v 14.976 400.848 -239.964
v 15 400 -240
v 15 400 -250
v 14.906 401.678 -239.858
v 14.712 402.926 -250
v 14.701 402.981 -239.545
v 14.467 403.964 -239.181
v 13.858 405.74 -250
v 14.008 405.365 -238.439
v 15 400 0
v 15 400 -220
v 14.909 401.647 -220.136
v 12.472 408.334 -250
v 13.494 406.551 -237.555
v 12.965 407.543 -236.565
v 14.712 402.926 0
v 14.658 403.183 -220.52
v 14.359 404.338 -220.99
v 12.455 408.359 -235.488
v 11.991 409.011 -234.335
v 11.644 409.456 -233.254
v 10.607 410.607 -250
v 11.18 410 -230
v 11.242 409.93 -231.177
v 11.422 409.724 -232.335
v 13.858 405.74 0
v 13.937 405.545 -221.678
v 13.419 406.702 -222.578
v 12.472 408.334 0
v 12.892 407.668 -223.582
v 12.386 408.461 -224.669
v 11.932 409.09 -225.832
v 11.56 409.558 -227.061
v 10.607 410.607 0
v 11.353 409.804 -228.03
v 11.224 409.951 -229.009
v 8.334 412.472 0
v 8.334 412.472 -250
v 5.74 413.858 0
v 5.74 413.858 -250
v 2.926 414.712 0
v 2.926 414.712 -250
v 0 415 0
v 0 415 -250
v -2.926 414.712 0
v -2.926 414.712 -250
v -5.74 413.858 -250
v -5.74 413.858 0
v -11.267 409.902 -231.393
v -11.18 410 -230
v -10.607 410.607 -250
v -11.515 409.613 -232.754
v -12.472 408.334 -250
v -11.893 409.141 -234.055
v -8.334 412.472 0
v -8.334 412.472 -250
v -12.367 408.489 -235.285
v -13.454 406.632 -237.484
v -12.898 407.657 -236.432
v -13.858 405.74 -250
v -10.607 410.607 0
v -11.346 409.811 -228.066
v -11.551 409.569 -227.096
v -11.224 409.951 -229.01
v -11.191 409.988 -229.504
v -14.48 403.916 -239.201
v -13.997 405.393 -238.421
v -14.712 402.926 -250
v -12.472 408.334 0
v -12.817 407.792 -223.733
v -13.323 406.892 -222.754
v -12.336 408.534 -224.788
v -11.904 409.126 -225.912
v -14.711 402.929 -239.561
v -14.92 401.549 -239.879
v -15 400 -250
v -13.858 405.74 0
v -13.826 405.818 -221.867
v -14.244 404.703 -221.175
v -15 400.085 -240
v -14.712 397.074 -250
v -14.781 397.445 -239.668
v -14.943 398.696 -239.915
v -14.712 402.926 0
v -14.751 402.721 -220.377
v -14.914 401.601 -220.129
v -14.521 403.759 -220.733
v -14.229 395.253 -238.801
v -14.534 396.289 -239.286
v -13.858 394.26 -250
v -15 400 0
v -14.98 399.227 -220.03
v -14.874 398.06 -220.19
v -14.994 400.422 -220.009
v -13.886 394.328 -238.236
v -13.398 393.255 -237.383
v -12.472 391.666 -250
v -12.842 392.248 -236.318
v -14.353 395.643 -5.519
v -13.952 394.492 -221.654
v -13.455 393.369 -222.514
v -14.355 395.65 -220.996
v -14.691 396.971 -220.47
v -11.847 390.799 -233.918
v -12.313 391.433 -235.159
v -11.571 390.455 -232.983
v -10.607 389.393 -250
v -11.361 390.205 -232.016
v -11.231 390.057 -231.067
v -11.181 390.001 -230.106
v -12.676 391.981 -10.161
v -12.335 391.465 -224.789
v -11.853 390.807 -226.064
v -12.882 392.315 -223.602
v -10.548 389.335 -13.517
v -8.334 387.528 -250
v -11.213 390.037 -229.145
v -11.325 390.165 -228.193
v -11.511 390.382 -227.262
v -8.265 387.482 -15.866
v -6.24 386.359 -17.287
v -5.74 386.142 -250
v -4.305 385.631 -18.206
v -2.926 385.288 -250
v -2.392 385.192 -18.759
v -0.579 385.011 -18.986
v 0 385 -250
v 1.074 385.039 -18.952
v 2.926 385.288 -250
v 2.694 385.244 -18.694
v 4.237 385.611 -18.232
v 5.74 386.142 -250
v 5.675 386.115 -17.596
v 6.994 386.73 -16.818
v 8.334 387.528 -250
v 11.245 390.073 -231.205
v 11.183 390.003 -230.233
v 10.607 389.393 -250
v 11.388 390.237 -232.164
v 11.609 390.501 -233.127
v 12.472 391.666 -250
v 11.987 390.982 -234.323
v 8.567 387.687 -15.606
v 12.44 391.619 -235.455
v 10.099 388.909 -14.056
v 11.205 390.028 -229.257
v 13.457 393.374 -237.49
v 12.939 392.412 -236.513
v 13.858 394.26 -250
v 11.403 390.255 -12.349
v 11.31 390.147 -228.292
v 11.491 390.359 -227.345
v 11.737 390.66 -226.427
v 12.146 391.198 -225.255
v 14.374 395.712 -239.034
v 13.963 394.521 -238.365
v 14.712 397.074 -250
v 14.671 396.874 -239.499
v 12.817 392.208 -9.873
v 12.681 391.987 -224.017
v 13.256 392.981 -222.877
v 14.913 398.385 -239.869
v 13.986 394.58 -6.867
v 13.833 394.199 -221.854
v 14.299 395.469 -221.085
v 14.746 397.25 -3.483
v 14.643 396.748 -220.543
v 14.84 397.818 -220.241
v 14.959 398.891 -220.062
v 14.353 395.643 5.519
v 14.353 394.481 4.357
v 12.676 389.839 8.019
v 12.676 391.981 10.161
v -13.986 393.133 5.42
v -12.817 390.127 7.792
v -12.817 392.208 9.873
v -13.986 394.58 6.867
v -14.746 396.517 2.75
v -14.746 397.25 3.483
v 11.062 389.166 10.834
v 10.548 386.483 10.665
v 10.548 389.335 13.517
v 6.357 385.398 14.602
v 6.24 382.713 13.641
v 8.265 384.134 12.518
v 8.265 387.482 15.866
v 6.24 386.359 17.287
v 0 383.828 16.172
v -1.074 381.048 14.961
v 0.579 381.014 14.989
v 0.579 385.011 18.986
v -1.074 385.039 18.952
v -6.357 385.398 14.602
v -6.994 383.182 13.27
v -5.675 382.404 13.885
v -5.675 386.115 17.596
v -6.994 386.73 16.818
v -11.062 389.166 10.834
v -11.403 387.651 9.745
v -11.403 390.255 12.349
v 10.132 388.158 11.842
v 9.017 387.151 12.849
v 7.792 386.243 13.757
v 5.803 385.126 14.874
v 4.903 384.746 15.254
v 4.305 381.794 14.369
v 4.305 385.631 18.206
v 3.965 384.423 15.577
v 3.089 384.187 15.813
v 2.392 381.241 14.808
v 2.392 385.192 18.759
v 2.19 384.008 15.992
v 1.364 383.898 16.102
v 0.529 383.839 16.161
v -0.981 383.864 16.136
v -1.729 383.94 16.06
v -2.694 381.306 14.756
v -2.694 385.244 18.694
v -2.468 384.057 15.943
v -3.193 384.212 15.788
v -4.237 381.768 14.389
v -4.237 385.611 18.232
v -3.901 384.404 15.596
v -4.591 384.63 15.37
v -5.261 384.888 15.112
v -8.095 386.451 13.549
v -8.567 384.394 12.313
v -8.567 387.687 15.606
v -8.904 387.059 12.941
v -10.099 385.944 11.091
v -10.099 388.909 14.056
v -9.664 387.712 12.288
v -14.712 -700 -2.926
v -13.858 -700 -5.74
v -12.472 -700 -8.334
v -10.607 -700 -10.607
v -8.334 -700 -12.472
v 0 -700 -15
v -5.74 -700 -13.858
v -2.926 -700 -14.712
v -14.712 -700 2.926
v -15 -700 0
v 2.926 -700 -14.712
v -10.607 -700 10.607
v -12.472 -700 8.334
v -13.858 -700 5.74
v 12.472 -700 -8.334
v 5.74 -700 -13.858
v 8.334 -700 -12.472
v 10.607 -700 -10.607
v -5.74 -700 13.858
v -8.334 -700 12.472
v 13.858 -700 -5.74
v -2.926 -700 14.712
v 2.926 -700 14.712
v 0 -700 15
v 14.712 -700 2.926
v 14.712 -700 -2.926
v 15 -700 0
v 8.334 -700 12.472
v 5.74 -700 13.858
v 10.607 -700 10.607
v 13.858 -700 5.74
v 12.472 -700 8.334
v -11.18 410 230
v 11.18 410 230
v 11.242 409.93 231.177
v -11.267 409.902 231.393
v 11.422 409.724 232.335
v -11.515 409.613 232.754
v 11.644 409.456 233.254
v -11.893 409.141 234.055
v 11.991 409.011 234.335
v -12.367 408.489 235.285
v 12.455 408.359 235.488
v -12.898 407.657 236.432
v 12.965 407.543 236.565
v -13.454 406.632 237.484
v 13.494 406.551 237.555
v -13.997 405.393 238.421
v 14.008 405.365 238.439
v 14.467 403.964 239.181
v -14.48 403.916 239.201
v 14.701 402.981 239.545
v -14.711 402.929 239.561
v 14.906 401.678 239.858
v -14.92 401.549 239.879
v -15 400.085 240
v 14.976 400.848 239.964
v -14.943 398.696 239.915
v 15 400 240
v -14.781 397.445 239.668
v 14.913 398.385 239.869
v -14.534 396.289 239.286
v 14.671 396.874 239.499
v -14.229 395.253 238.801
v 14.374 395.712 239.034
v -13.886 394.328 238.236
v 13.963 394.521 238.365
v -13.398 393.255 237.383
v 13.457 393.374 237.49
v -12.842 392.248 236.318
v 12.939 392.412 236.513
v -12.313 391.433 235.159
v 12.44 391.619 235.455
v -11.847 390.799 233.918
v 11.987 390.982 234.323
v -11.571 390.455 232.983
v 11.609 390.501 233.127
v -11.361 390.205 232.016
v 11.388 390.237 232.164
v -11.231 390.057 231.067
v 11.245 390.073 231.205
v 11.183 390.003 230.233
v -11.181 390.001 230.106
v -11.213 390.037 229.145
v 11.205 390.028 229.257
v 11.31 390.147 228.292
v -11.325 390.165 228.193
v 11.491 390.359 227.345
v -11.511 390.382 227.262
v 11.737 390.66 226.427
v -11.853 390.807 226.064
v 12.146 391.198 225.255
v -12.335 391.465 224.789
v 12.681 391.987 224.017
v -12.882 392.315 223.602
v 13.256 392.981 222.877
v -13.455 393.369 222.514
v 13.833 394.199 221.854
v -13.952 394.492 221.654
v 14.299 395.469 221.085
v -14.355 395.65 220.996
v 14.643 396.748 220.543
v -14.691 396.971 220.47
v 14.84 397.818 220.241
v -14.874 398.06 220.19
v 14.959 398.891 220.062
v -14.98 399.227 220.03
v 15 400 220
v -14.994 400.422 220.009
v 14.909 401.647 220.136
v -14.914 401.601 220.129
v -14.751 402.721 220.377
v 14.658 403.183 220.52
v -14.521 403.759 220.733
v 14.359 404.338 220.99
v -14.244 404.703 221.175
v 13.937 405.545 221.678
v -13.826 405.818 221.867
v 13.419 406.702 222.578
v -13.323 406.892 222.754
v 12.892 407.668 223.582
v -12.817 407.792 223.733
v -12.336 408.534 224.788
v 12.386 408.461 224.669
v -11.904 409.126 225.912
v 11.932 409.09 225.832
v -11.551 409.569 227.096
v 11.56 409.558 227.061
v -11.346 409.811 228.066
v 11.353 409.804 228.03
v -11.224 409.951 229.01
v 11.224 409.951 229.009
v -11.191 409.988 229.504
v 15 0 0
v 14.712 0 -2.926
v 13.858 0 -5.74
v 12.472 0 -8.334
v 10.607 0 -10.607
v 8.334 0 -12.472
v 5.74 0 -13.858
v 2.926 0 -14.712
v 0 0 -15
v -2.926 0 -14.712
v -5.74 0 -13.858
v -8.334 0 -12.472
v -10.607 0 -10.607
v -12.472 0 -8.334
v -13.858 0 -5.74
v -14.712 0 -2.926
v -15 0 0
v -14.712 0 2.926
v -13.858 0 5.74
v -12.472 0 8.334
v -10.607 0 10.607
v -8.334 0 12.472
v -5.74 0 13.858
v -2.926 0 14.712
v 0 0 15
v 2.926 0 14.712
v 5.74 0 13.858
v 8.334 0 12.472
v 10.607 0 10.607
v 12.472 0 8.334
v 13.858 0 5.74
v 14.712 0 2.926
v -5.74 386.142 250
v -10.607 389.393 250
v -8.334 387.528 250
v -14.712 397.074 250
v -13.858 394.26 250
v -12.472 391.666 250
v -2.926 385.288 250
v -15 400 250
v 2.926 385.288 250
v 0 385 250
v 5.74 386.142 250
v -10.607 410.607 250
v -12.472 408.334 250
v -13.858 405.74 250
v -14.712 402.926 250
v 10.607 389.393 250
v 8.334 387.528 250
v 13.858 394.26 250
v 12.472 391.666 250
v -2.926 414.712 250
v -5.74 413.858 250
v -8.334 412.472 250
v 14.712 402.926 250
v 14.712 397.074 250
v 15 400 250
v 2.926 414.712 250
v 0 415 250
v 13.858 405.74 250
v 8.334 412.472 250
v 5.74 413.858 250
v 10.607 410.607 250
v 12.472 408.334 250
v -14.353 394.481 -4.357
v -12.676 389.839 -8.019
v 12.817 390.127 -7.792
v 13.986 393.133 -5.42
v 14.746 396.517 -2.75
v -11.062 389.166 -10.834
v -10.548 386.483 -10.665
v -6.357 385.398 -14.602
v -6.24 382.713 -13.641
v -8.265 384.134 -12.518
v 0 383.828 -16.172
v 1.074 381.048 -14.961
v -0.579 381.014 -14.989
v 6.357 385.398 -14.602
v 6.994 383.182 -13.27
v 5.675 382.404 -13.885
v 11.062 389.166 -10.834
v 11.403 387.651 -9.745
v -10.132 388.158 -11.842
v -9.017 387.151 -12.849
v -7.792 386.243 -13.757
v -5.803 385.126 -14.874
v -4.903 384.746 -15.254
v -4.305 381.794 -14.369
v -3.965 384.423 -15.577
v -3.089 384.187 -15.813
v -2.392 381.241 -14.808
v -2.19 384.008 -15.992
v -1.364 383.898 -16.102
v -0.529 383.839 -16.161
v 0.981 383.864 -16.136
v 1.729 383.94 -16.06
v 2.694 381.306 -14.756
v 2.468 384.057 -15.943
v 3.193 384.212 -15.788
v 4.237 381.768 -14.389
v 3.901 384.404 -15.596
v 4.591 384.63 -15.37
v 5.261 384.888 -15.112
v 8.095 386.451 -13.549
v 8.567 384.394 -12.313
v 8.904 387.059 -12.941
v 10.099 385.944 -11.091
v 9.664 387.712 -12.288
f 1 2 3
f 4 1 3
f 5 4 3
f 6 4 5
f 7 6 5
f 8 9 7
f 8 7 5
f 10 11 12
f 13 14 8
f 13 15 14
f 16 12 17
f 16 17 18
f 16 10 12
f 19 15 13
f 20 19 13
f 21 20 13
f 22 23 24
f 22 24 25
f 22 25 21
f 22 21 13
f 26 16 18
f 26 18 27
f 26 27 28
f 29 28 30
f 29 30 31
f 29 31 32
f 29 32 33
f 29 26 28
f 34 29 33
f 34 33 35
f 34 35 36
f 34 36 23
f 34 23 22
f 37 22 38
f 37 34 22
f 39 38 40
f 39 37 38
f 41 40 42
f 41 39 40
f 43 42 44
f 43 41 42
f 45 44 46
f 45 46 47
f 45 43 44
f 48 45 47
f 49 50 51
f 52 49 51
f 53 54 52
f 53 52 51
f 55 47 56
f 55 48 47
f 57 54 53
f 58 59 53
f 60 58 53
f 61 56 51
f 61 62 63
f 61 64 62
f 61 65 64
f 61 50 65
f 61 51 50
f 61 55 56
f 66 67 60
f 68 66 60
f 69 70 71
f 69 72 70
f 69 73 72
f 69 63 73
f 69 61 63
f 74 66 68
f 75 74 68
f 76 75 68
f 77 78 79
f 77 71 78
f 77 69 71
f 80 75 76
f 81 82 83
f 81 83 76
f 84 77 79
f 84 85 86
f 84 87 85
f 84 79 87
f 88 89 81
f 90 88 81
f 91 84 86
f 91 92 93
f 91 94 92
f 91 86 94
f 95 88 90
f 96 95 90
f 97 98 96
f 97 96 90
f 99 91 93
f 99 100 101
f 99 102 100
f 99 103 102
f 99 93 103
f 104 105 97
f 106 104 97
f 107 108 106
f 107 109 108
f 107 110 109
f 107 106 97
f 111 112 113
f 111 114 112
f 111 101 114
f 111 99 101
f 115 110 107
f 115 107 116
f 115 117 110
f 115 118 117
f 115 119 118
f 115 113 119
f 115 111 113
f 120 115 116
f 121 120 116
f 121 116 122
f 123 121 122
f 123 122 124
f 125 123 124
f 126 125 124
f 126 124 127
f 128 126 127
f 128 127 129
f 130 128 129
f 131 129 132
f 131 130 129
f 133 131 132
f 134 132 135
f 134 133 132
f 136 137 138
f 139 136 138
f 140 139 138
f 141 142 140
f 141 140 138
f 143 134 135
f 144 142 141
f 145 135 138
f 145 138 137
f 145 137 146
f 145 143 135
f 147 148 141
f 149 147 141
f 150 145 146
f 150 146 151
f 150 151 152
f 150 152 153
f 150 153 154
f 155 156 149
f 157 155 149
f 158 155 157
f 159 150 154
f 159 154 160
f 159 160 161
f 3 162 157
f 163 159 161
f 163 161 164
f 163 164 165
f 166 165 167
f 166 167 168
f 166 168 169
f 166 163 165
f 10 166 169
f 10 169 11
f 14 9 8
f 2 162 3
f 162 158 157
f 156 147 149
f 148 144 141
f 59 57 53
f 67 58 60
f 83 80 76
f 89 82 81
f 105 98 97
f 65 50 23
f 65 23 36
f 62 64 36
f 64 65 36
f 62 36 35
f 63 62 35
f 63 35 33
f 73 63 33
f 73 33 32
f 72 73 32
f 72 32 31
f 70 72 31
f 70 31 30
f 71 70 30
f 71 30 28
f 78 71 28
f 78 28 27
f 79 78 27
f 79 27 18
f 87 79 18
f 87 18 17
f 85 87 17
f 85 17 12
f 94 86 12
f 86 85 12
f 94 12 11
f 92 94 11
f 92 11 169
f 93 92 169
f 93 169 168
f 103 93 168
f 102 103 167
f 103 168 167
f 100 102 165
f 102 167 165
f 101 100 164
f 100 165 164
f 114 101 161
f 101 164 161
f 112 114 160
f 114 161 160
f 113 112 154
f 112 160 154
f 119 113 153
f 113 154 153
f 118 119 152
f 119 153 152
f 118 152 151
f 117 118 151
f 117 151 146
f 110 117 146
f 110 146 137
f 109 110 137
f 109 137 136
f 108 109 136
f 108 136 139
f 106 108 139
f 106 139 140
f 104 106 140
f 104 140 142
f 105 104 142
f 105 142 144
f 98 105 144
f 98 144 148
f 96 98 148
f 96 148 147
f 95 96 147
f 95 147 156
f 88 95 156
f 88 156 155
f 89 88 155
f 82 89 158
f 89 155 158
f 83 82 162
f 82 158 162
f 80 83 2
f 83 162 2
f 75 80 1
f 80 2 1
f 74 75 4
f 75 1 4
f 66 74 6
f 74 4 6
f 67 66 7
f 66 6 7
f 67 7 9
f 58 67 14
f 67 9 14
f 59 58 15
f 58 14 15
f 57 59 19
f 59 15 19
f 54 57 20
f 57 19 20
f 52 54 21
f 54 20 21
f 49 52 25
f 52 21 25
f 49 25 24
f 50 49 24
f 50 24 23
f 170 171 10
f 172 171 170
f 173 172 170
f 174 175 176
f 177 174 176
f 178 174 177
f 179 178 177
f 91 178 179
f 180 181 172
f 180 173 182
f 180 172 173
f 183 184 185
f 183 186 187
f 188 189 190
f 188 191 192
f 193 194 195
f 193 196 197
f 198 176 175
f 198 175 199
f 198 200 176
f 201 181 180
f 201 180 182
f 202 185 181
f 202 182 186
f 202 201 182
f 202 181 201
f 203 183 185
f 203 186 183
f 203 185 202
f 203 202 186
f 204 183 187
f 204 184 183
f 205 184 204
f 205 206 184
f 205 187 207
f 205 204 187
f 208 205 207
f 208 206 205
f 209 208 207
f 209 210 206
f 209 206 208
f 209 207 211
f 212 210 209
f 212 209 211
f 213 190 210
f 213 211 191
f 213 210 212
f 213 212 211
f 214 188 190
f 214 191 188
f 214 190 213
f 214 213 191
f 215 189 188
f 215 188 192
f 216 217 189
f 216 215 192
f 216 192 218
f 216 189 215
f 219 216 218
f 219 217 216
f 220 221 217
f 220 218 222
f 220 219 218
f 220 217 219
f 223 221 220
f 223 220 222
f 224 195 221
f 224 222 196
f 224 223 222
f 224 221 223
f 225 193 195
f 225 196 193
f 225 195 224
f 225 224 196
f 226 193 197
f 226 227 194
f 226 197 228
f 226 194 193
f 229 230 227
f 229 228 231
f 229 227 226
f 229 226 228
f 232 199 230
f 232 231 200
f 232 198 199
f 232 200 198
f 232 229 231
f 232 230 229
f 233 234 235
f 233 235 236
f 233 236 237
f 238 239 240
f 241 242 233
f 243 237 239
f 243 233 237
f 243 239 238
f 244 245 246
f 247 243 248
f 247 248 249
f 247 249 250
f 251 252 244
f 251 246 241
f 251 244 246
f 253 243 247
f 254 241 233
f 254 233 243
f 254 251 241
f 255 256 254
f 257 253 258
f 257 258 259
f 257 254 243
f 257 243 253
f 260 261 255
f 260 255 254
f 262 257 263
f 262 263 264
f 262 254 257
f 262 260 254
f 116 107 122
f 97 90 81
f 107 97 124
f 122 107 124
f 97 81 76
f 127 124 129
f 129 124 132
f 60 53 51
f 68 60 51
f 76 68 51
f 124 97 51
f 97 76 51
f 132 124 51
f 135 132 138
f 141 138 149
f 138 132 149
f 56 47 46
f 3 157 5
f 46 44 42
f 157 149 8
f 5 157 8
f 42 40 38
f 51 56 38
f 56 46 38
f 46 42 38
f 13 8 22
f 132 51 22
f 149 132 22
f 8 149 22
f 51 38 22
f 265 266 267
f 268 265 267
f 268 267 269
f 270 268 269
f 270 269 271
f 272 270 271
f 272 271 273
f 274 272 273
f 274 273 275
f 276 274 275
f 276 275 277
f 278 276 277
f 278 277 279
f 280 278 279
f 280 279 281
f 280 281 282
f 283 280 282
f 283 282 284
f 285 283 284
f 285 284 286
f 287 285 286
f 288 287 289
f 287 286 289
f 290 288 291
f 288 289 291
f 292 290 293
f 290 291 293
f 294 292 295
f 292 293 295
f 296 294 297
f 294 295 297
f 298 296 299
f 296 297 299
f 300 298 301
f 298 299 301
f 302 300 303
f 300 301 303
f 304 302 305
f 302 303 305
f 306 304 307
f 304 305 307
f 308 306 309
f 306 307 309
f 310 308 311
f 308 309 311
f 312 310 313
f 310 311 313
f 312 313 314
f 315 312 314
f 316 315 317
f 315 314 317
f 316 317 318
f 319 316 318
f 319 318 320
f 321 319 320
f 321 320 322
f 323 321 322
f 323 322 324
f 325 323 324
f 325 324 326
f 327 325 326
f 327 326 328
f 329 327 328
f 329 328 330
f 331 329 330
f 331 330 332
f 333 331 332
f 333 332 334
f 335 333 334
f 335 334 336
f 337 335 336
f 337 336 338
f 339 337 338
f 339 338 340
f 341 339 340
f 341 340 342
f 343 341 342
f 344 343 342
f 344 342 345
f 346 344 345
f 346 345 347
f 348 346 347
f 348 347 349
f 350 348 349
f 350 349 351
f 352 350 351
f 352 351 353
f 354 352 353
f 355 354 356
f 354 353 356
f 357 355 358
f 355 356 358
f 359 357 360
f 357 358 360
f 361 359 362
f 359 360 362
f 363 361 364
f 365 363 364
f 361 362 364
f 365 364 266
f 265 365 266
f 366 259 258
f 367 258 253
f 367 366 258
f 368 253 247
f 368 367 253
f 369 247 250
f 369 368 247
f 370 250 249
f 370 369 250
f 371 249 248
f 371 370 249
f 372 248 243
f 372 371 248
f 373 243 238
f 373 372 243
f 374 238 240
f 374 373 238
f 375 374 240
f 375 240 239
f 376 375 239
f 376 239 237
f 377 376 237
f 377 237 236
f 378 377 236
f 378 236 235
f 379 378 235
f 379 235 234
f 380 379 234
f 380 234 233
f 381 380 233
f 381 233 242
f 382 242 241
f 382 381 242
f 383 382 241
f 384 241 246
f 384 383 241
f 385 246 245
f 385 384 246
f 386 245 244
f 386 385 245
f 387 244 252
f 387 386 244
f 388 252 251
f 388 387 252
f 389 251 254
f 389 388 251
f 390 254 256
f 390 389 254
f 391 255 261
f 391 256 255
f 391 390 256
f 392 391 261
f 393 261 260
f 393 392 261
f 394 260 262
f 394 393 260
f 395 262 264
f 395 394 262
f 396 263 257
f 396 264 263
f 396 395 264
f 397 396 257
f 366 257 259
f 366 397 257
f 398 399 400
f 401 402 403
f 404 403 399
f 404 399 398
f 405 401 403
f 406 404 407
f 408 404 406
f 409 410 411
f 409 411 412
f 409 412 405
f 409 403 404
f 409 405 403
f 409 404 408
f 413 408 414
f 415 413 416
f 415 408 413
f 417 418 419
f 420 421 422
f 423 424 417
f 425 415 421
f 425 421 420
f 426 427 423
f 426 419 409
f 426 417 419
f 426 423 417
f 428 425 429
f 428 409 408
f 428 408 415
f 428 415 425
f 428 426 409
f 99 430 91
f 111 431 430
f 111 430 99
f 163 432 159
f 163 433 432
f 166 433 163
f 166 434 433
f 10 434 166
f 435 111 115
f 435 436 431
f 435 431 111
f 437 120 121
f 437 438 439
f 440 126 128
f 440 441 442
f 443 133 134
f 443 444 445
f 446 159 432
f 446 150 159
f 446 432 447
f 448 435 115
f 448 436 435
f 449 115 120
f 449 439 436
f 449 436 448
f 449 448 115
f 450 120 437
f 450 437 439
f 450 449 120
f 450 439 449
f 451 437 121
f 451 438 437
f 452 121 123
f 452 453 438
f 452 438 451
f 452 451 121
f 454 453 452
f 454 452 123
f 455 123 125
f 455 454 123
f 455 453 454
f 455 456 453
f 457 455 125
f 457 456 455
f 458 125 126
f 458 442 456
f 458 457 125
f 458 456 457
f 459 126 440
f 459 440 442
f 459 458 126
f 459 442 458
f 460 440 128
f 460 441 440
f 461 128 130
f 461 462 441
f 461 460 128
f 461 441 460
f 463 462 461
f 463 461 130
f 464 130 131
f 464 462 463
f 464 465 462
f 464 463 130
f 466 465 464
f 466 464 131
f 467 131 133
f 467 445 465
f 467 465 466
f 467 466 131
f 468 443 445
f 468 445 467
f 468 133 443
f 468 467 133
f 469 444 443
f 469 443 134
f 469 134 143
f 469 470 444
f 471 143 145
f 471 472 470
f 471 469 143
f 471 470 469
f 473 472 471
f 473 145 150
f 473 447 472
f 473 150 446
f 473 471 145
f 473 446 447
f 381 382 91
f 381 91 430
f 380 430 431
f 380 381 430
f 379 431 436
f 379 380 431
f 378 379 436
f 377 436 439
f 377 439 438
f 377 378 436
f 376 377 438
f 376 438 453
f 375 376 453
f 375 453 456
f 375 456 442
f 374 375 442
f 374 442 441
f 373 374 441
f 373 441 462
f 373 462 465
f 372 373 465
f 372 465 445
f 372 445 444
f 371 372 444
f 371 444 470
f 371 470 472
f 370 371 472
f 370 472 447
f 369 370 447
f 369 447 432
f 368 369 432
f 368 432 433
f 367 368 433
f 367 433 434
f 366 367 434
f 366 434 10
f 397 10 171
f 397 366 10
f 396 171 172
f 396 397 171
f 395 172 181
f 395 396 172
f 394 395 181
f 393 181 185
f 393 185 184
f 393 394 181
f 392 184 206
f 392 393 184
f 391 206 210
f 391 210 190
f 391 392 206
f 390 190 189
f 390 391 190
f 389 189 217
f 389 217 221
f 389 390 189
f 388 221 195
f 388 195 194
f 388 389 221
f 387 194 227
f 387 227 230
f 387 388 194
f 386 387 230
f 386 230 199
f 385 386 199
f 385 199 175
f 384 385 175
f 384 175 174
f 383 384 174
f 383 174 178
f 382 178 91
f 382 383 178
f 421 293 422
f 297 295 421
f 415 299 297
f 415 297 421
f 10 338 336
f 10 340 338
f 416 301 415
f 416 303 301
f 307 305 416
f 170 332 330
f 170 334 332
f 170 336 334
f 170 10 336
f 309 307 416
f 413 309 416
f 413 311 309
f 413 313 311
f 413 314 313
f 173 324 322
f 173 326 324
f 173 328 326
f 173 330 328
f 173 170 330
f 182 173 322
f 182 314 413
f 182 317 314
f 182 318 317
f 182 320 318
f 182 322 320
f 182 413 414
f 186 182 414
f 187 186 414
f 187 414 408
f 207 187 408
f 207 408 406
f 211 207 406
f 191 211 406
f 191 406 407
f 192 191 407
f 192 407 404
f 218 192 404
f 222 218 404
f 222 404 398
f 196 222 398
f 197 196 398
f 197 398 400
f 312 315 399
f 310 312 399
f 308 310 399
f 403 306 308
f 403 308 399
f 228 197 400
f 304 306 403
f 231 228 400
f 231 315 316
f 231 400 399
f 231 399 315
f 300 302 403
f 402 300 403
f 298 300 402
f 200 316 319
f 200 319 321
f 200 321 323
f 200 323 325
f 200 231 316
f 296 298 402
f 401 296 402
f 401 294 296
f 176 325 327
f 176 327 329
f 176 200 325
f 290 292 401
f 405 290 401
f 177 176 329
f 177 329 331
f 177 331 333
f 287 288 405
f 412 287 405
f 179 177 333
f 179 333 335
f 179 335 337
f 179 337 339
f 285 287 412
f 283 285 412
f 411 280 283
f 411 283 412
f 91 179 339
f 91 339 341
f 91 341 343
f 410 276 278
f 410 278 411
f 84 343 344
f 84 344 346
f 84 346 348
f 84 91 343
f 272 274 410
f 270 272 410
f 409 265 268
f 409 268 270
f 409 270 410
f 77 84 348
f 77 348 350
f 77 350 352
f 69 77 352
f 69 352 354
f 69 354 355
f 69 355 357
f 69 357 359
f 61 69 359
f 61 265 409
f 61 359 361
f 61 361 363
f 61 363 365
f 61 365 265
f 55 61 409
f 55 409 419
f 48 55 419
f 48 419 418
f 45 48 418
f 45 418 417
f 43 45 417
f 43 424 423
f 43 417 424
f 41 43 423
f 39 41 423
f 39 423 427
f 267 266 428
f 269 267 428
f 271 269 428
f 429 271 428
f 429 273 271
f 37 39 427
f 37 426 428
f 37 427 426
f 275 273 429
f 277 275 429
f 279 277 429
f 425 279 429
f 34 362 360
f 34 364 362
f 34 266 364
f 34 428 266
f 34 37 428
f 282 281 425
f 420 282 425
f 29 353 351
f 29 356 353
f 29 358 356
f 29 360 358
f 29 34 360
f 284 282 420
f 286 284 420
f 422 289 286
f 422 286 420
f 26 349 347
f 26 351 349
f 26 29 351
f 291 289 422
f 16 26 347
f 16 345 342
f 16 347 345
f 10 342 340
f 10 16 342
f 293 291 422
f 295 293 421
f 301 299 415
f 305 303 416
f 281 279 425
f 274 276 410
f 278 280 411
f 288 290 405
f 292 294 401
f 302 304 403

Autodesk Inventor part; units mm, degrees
ref_plane "XZ Plane" through (0, 0, 0) normal (0, 1, 0) x (-1, 0, 0)
ref_plane "XY Plane" through (0, 0, 0) normal (0, 0, 1) x (1, 0, 0)
sketch "Szkic1" plane through (0, 0, 0) normal (0, 1, 0) x (-1, 0, 0)
  circle A0 centre (0, 0) radius 15
  dimension "d0" = 30
extrude "Wyciągnięcie proste1" add sketch "Szkic1" along normal blind 400
sketch "Szkic2" plane through (0, 0, 0) normal (0, 0, 1) x (1, 0, 0)
  point P0 (0, 0)
sketch "Szkic3" plane through (0, 0, 0) normal (0, 0, 1) x (1, 0, 0)
  circle A0 centre (0, 400) radius 15
  point P0 (0, 0)
  dimension "d3" = 30
extrude "Wyciągnięcie proste2" add sketch "Szkic3" along normal mid plane 500
fillet "Zaokrąglenie1" radius 4 4 edges at (-10.6066, 389.3934, -10.6066) (10.6066, 389.3934, -10.6066) (10.6066, 389.3934, 10.6066) (-10.6066, 389.3934, 10.6066)
ref_plane "Płaszczyzna konstrukcyjna1" through (15, 0, 0) normal (1, 0, 0) x (0, 1, 0)
sketch "Szkic4" plane through (15, 0, 0) normal (1, 0, 0) x (0, 1, 0)
  line L0 (400, 0) -> (400, 0) projected
  line L1 (400, 0) -> (400, 0) projected
  line L2 (415, 250) -> (385, 250) projected
  line L3 (385, -250) -> (415, -250) projected
  line L4 (400, 0) -> (400, 0) projected
  line L5 (400, 0) -> (400, 0) projected
  line L6 (0, 15) -> (0, -15) projected
  line L7 (0, 15) -> (381, 15) projected
  line L8 (0, -15) -> (381, -15) projected
  line L9 (385, -250) -> (385, 250) projected
  line L10 (415, -250) -> (415, 250) projected
  circle A0 centre (400, 230) radius 10
  point P0 (0, 0)
  dimension "d8" = 20
  dimension "d9" = 20
extrude "Wyciągnięcie proste3" cut sketch "Szkic4" against normal through all contours A0
mirror "Odbicie lustrzane1" about plane through (0, 0, 0) normal (0, 0, 1) of "Wyciągnięcie proste3"
sketch "Szkic5" plane through (0, 0, 0) normal (0, -1, 0) x (1, 0, 0)
  circle A0 centre (0, 0) radius 15 projected
extrude "Wyciągnięcie proste4" add sketch "Szkic5" along normal blind 700
sketch "Szkic6" plane through (15, 0, 0) normal (1, 0, 0) x (0, 1, 0)
  point P0 (0, 0)
properties part number "1" material "Złote"
